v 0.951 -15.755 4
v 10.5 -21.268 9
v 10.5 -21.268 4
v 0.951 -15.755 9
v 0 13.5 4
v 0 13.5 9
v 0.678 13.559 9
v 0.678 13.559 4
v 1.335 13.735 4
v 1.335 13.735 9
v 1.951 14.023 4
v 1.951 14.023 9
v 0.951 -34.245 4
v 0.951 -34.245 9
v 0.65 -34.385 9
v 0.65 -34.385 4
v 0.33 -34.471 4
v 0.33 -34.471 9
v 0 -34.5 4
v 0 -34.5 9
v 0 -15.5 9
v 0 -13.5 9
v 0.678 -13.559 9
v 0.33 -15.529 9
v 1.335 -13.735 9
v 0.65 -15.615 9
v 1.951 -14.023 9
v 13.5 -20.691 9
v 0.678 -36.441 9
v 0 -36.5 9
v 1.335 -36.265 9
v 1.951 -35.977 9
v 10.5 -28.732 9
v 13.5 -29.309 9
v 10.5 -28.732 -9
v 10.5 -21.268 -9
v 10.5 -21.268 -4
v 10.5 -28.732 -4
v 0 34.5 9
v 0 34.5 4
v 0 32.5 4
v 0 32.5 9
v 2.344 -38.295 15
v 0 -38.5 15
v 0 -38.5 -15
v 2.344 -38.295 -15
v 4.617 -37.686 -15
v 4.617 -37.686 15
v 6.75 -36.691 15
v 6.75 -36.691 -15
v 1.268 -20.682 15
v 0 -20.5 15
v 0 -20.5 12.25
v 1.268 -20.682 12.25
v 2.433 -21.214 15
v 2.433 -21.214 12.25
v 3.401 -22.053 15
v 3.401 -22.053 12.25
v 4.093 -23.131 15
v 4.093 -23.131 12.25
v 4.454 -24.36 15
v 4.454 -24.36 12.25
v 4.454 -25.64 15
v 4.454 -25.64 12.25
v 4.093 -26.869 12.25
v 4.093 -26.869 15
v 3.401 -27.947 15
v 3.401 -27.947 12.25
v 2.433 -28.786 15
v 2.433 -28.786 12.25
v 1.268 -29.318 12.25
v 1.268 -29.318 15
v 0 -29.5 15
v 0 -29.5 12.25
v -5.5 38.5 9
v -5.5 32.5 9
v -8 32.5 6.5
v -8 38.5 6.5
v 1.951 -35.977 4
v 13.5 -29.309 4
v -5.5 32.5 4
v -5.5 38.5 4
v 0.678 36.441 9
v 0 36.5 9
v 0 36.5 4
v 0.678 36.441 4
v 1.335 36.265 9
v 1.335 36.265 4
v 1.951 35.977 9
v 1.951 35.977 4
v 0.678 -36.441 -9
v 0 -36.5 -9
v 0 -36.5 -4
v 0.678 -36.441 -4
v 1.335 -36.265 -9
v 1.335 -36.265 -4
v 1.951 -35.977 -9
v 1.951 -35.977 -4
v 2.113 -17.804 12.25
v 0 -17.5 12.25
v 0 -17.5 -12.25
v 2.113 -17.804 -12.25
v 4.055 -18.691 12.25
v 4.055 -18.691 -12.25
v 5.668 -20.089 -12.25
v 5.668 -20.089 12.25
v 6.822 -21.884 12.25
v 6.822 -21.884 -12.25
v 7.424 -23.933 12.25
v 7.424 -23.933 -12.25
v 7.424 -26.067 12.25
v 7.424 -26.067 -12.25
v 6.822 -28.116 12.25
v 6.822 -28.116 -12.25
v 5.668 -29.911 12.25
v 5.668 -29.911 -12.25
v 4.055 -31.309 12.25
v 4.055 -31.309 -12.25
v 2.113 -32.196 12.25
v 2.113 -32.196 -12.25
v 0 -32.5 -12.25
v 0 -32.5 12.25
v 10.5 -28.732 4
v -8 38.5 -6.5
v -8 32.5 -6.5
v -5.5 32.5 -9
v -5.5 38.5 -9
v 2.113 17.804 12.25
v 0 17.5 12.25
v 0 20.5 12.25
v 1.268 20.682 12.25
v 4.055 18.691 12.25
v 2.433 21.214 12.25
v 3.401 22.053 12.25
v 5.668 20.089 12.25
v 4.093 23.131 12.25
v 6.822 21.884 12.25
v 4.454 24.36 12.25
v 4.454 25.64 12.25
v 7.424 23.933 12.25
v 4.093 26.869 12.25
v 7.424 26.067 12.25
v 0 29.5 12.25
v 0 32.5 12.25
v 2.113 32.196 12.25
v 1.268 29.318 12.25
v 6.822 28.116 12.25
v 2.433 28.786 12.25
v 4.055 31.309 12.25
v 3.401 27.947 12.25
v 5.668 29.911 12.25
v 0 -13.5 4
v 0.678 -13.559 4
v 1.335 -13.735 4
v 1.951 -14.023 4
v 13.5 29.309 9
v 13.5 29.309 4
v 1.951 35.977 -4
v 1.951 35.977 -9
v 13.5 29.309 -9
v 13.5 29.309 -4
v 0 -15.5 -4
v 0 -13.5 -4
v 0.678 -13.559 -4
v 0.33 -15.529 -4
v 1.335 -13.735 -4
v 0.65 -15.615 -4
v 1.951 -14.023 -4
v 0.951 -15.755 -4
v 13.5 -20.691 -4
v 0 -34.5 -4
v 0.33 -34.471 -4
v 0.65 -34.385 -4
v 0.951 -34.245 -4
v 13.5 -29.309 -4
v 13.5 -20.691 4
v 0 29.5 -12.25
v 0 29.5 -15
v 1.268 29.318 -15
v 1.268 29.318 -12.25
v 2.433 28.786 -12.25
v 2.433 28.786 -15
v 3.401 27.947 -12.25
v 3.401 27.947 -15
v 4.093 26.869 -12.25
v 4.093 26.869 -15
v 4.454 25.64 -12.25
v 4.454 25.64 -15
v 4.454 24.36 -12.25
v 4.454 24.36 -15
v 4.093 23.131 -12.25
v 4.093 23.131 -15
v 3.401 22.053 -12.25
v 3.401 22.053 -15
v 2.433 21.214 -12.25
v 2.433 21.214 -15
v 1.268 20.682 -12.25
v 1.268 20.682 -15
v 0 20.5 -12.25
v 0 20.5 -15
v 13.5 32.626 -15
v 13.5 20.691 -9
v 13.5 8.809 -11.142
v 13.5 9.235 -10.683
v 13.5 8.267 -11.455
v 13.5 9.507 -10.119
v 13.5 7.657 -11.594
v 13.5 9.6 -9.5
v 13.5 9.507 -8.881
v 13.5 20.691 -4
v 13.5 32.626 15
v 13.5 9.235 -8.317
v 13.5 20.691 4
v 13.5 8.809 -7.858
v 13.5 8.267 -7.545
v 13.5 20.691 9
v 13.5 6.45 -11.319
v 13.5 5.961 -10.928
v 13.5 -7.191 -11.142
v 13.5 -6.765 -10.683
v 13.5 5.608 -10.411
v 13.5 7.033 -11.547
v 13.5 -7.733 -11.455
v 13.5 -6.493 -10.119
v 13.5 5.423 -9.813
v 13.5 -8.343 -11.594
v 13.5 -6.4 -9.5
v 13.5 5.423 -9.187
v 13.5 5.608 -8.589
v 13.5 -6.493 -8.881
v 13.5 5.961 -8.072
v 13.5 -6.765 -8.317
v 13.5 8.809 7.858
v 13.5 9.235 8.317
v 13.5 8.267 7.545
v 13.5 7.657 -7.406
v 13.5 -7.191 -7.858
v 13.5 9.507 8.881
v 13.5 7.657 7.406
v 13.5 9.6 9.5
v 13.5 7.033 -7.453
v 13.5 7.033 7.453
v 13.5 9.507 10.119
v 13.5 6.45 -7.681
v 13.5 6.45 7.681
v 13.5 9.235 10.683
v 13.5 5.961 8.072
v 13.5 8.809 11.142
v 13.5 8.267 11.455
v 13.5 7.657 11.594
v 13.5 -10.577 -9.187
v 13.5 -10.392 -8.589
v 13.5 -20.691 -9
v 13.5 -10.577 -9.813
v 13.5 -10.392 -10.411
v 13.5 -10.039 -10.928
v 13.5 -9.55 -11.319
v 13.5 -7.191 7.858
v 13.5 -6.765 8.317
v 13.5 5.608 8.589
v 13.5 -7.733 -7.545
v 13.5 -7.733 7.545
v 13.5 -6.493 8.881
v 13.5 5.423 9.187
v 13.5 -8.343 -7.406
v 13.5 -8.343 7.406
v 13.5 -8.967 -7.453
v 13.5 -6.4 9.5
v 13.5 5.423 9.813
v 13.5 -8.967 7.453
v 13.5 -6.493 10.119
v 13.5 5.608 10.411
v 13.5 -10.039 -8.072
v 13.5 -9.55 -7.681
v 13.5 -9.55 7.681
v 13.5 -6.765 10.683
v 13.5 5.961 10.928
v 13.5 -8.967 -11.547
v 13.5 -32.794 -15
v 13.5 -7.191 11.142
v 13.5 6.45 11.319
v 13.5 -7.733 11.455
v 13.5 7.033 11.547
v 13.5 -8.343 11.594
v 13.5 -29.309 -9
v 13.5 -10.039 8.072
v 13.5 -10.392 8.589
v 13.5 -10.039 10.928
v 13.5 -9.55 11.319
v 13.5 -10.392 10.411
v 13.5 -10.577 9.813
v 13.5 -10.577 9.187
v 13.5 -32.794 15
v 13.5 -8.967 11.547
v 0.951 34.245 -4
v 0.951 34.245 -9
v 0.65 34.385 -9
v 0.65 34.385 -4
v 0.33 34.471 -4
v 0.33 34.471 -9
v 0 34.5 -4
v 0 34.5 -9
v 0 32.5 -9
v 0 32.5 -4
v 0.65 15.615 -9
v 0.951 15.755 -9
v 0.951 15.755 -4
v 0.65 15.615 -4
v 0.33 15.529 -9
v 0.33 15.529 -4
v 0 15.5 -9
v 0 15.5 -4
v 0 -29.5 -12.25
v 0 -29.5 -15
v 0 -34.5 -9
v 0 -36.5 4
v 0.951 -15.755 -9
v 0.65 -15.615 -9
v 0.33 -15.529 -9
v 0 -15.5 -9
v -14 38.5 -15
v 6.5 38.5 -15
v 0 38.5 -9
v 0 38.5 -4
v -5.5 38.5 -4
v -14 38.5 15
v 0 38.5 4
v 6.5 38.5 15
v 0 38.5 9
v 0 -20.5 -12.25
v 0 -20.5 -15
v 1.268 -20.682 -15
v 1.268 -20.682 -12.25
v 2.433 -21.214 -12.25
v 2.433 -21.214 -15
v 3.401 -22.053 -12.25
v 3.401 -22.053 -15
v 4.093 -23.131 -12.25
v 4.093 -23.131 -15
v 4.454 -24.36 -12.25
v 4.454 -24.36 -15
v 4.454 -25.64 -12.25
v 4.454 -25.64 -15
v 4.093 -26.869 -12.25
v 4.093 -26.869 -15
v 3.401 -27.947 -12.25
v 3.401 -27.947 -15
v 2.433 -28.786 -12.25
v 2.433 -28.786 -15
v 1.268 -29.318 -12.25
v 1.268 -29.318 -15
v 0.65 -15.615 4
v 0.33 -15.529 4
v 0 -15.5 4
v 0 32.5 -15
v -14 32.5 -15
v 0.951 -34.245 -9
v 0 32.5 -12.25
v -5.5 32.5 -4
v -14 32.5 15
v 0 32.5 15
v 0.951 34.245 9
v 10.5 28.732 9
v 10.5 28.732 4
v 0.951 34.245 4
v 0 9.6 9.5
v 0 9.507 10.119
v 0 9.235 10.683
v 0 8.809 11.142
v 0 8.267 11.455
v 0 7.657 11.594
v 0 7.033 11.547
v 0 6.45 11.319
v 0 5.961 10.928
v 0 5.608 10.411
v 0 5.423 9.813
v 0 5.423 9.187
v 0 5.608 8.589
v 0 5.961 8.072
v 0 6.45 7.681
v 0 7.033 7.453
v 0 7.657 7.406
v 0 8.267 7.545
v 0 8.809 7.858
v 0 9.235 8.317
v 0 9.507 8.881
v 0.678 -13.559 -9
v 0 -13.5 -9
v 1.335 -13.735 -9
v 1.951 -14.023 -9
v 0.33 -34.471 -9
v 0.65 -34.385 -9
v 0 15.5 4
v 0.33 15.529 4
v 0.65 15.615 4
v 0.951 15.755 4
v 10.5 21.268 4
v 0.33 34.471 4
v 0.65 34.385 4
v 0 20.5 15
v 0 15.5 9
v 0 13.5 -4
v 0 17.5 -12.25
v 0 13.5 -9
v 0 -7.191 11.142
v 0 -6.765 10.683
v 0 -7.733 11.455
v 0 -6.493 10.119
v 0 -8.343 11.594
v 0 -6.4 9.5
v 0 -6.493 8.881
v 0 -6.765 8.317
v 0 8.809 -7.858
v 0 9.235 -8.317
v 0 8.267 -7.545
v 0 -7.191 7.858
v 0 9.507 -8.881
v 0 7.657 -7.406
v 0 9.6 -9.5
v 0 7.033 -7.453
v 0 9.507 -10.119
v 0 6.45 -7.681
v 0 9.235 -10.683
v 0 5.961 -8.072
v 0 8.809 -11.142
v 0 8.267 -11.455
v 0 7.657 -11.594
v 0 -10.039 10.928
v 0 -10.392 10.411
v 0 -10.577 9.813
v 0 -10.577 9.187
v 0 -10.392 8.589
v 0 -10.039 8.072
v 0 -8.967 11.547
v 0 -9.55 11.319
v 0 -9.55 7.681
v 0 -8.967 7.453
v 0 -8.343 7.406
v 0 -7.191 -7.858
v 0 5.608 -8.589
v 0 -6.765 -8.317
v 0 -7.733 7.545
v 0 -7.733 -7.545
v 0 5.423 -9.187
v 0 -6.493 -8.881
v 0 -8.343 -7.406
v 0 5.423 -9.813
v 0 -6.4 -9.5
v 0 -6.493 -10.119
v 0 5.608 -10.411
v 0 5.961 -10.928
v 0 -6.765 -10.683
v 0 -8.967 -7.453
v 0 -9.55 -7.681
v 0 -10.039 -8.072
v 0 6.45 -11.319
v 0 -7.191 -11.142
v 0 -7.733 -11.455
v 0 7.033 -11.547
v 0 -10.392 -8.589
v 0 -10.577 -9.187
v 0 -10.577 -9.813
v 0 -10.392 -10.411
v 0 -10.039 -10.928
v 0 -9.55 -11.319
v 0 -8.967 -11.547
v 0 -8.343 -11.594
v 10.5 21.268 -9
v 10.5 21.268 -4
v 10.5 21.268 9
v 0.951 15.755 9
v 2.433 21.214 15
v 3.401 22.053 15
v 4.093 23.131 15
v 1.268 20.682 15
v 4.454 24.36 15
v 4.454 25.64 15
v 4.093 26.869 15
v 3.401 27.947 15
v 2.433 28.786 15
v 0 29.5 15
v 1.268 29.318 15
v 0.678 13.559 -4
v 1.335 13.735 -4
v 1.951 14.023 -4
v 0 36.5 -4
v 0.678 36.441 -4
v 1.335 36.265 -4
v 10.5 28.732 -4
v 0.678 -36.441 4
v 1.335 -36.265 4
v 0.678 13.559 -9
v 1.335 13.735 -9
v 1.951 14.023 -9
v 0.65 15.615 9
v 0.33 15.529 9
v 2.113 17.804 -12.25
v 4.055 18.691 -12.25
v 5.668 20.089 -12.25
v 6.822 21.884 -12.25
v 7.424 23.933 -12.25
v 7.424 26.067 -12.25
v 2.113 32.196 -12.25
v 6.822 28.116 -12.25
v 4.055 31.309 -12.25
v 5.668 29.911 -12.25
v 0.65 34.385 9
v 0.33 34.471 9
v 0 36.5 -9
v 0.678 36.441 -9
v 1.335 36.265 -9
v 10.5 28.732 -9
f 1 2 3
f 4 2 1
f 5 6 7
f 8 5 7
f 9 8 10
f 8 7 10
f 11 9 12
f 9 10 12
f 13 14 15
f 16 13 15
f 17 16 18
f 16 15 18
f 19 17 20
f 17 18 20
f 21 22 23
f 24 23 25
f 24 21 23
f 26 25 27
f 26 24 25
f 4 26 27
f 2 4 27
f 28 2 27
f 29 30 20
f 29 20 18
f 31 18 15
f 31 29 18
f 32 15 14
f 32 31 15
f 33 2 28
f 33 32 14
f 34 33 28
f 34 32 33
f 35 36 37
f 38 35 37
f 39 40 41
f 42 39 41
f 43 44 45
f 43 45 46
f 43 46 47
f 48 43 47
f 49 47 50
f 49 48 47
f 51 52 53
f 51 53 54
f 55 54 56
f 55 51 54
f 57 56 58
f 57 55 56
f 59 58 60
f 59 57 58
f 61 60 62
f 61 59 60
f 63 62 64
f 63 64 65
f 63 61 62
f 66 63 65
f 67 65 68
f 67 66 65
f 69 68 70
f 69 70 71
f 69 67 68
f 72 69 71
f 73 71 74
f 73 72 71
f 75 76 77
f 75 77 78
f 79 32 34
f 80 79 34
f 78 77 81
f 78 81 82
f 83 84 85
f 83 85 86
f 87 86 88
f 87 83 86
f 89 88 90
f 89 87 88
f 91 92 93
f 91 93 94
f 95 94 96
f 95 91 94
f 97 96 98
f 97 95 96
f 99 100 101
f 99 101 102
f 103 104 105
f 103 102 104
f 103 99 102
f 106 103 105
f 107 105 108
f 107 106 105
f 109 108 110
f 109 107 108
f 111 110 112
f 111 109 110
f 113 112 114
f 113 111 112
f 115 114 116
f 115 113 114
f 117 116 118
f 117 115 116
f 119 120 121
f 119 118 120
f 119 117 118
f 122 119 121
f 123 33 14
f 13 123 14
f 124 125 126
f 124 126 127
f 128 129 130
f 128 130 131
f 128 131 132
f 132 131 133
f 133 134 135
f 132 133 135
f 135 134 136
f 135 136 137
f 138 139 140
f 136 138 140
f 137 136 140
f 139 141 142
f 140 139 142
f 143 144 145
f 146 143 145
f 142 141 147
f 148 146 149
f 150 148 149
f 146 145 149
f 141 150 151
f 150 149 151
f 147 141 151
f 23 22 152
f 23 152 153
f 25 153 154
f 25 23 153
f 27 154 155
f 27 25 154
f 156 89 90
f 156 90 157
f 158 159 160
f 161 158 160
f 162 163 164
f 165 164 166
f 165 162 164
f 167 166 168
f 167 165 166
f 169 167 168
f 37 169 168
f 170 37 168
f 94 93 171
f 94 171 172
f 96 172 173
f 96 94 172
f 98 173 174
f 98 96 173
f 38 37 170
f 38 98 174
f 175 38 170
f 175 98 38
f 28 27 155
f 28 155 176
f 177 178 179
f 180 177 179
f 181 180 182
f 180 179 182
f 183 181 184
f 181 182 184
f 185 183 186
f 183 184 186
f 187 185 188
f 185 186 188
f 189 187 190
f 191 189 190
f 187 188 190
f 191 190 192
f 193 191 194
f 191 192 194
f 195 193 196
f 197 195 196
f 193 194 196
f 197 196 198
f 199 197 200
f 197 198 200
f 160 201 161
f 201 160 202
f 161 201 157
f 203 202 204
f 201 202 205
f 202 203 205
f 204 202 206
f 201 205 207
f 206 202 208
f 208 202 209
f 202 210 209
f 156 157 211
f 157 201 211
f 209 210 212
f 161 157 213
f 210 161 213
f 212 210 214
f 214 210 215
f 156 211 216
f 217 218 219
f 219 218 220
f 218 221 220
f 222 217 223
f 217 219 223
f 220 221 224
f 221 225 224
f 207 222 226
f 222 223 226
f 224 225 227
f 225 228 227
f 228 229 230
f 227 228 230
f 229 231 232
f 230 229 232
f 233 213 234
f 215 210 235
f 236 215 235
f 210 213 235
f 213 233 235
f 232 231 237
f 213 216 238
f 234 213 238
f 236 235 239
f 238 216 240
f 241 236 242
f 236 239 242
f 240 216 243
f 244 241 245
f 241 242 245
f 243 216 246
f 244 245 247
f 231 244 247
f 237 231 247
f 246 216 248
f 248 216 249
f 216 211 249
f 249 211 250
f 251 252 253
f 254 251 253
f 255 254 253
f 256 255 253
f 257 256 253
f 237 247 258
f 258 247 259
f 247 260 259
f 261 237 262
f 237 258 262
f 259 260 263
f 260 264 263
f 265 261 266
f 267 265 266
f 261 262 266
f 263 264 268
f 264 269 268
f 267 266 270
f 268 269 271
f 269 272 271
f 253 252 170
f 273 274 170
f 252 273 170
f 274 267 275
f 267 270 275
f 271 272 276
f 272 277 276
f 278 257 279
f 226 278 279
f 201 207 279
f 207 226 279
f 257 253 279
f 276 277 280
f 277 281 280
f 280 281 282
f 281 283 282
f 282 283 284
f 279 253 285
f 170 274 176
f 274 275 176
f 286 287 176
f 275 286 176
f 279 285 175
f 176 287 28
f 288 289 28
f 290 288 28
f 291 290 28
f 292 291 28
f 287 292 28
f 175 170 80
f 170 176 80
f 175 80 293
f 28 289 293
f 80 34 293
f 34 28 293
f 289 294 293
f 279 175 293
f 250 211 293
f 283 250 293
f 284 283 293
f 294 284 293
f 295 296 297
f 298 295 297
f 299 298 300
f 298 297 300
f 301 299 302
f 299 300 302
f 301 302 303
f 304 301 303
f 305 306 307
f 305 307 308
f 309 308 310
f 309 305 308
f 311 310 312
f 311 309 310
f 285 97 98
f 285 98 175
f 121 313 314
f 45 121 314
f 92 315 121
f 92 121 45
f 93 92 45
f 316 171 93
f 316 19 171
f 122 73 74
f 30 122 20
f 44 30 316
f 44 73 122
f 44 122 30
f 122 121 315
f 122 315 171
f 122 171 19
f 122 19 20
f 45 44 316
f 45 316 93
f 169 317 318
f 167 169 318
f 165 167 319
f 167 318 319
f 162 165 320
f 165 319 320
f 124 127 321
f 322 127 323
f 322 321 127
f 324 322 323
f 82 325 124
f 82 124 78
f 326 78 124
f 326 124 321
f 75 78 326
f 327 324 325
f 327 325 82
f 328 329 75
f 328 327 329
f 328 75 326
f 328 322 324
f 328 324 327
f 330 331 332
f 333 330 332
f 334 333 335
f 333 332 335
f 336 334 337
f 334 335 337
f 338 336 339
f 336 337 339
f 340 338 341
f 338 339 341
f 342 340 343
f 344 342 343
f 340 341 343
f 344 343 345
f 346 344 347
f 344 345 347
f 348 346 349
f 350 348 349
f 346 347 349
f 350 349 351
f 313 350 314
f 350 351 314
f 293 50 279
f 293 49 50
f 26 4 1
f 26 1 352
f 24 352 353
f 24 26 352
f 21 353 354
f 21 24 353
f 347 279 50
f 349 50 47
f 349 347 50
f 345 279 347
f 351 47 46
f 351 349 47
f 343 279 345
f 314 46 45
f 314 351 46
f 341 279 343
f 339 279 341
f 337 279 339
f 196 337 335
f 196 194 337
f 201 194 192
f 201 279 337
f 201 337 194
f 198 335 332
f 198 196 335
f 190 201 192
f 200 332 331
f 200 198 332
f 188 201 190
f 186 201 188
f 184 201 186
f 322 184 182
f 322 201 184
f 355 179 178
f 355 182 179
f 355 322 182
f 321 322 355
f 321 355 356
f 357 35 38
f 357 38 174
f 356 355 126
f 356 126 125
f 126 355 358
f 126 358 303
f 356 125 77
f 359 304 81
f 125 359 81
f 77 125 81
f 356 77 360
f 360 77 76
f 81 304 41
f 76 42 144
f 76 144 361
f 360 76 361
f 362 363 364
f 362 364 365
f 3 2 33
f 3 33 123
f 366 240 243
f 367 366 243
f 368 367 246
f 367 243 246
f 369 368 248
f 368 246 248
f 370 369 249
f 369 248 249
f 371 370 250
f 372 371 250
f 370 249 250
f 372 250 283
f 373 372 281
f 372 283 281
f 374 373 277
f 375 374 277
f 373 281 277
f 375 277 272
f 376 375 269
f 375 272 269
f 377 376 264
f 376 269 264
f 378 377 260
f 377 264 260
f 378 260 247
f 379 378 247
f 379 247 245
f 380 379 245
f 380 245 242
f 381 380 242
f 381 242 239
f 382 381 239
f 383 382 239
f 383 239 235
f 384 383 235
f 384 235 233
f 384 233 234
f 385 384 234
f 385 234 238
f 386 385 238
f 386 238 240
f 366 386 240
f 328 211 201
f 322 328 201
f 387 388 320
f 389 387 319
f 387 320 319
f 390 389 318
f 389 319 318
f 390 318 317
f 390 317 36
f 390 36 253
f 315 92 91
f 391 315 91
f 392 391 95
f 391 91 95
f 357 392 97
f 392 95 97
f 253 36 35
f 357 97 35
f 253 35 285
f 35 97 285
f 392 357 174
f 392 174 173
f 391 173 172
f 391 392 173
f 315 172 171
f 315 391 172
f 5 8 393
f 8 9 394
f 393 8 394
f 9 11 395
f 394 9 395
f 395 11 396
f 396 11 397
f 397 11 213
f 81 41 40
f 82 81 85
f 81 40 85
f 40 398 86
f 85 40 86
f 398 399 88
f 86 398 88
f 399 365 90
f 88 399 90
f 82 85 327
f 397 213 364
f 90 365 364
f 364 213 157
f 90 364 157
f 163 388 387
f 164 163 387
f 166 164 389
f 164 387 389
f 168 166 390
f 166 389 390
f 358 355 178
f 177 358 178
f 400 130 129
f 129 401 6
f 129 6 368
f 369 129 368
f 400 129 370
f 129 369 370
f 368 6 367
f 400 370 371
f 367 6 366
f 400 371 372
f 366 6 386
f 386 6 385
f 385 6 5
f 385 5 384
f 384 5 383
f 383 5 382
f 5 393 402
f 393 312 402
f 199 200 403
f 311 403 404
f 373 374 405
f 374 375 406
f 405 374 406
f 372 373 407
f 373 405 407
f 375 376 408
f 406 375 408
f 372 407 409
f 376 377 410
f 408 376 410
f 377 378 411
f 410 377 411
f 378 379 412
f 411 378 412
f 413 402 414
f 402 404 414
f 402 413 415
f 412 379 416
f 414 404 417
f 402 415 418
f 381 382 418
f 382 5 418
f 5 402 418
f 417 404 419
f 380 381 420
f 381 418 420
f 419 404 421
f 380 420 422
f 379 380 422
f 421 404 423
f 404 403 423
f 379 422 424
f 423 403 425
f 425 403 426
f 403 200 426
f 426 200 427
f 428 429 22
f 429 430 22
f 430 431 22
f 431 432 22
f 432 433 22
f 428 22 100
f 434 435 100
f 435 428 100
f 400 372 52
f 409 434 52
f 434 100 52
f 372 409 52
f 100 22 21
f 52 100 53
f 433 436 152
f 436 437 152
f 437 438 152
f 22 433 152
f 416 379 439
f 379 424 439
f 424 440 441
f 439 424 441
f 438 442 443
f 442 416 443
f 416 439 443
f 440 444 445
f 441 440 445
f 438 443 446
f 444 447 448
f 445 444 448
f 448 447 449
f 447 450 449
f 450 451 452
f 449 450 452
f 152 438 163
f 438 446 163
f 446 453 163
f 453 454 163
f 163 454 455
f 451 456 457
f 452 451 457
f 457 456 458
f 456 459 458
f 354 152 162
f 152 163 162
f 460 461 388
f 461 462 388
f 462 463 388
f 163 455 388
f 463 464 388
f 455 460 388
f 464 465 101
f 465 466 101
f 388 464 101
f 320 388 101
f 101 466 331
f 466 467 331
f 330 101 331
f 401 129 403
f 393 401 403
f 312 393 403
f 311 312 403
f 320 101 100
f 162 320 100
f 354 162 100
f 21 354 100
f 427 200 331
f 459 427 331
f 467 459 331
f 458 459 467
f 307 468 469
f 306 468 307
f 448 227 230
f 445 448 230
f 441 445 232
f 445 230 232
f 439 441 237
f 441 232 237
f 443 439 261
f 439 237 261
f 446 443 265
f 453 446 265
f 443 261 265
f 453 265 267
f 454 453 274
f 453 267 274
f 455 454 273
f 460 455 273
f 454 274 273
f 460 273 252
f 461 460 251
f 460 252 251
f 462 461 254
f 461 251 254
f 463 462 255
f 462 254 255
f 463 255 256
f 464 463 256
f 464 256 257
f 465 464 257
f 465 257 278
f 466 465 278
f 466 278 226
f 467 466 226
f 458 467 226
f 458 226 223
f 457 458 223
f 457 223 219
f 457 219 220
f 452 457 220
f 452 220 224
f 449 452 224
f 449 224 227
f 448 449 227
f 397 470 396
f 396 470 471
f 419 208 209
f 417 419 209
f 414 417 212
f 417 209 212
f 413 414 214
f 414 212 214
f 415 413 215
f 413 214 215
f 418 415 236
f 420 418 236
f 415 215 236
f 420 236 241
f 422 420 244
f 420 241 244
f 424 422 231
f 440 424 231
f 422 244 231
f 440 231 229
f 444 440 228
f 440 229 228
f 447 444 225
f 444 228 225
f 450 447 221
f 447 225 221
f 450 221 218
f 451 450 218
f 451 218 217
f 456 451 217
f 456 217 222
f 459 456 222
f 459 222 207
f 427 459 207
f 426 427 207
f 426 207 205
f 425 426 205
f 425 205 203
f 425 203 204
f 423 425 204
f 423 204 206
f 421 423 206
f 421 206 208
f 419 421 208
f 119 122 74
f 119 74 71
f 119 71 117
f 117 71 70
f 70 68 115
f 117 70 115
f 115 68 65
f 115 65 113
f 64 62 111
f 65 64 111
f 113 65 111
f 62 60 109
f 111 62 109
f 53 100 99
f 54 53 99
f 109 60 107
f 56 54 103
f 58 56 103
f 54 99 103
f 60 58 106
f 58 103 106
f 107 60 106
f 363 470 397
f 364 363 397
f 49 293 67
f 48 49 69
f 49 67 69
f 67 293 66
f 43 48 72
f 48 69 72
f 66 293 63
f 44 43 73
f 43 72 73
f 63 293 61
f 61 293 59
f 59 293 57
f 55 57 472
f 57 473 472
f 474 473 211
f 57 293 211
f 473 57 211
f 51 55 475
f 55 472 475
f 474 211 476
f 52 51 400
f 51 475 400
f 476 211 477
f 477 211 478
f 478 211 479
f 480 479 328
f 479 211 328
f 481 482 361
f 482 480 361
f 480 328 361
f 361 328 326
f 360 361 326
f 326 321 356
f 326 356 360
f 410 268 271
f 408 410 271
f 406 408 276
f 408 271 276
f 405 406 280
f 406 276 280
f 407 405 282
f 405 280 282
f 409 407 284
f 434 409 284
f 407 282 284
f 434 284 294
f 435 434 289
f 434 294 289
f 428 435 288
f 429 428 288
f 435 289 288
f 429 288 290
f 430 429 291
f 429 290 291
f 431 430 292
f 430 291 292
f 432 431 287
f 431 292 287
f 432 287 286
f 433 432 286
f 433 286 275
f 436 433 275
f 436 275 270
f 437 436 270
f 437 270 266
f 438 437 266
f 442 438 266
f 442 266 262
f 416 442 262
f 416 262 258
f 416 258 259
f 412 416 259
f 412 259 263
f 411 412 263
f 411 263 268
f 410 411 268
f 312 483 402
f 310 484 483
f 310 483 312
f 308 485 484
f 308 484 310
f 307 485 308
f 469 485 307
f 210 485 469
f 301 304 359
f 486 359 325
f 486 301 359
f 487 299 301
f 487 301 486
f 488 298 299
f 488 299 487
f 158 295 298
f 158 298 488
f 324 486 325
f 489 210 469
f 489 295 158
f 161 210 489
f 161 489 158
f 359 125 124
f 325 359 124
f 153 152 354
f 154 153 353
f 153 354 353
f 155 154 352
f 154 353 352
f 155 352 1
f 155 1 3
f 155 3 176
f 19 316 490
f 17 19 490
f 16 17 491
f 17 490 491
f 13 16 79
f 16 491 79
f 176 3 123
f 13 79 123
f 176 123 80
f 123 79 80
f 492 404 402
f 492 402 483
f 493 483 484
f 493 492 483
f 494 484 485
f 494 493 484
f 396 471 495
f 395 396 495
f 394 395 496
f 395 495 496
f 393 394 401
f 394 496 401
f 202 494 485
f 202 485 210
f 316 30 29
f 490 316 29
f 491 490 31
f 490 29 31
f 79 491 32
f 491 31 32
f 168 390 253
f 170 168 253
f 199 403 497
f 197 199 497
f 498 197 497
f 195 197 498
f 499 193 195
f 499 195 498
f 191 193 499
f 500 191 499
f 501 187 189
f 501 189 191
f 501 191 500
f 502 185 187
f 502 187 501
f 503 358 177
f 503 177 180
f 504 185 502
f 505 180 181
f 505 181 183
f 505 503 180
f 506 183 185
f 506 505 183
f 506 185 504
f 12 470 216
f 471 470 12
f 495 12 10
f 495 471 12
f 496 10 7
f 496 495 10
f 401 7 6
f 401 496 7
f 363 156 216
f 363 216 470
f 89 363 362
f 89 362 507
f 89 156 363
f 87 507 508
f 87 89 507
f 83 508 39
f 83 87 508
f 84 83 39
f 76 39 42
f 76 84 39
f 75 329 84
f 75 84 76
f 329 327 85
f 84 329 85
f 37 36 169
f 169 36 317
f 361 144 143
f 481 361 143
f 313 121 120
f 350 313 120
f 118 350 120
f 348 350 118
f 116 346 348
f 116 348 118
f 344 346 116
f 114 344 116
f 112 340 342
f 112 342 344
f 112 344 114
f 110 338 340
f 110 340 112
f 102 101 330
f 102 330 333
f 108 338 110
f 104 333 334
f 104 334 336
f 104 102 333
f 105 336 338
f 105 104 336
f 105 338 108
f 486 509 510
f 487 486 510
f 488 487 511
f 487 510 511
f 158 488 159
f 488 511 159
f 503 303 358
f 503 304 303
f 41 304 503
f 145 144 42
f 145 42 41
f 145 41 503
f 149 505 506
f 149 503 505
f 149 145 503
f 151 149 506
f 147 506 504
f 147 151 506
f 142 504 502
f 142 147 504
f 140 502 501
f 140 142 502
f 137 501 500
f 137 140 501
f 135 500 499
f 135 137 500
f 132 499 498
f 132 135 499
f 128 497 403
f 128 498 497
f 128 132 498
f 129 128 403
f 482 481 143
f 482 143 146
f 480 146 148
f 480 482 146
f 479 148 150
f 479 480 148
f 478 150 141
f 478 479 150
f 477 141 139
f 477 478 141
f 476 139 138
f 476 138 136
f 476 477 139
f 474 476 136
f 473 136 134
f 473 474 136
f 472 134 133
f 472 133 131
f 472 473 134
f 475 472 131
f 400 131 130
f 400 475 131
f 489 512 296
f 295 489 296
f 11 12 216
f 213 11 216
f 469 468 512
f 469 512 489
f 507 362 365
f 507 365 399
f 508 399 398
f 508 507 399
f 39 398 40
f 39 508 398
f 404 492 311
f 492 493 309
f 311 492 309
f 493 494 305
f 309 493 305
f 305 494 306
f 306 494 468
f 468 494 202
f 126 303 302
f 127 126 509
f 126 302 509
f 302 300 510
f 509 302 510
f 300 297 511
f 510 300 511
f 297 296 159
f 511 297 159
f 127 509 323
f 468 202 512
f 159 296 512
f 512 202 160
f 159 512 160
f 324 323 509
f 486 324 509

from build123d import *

# Parameters (mm, degrees)
BOSS_EXTRUDE1_DEPTH     = 15
BOSS_EXTRUDE2_DEPTH     = 2.75
CUT_EXTRUDE1_START      = -6
CUT_EXTRUDE1_DEPTH      = 5
SKETCH5_W               = 5
SKETCH5_H               = 8.618802154
CUT_EXTRUDE2_DEPTH      = 3
MIRROR5_START           = -6
MIRROR5_COPY_1_DEPTH    = 5
MIRROR5_COPY_2_SKETCH_W = 5
MIRROR5_COPY_2_SKETCH_H = 8.618802154
MIRROR5_COPY_2_DEPTH    = 3
SKETCH6_R               = 2.1
CUT_EXTRUDE3_DEPTH      = 44.468379312
LPATTERN2_COUNT         = 2
LPATTERN2_PITCH         = 16
BOSS_EXTRUDE3_DEPTH     = 30
SKETCH9_W               = 8
SKETCH9_H               = 6
SKETCH9_W_2             = 6
BOSS_EXTRUDE4_DEPTH     = 14
SKETCH10_W              = 30
SKETCH10_H              = 6
BOSS_EXTRUDE5_DEPTH     = 6
CHAMFER1_SIZE           = 2.5
CHAMFER2_SIZE           = 7
CHAMFER2_SIZE2          = 5.873697418


with BuildPart() as part:
    # Sketch1 → Boss-Extrude1 (new, symmetric)
    with BuildSketch(Plane.XY):
        with BuildLine():
            Line((13.5, -25), (13.5, 25))
            Line((13.5, 25), (13.5, 32.794228634))
            Line((13.5, 32.794228634), (6.75, 36.691342951))
            ThreePointArc((6.75, 36.691342951), (3.494057109, 38.039998655), (0, 38.5))
            Line((0, 38.5), (0, 32.5))
            ThreePointArc((0, 32.5), (7.5, 25), (0, 17.5))
            Line((0, 17.5), (0, -17.5))
            ThreePointArc((0, -17.5), (7.5, -25), (0, -32.5))
            Line((0, -32.5), (0, -38.5))
            ThreePointArc((0, -38.5), (3.494057109, -38.039998655), (6.75, -36.691342951))
            Line((6.75, -36.691342951), (13.5, -32.794228634))
            Line((13.5, -32.794228634), (13.5, -25))
        make_face()
    extrude(amount=BOSS_EXTRUDE1_DEPTH, both=True)

    # Sketch2 → Boss-Extrude2 (add)
    with BuildSketch(Plane.XY.offset(15)):
        with BuildLine():
            Line((0, 32.5), (0, 29.5))
            ThreePointArc((0, 29.5), (4.5, 25), (0, 20.5))
            Line((0, 20.5), (0, 17.5))
            ThreePointArc((0, 17.5), (7.5, 25), (0, 32.5))
        make_face()
        with BuildLine():
            Line((0, -17.5), (0, -20.5))
            ThreePointArc((0, -20.5), (4.5, -25), (0, -29.5))
            Line((0, -29.5), (0, -32.5))
            ThreePointArc((0, -32.5), (7.5, -25), (0, -17.5))
        make_face()
    boss_extrude2 = extrude(amount=-BOSS_EXTRUDE2_DEPTH)

    # Mirror1: Boss-Extrude2 across plane
    add(boss_extrude2.mirror(Plane.XY))

    # Sketch3 → Cut-Extrude1 (cut)
    with BuildSketch(Plane.XY.offset(15).offset(CUT_EXTRUDE1_START)):
        with BuildLine():
            Line((0, 34.5), (0, 36.5))
            ThreePointArc((0, 36.5), (1.009892189, 36.367045171), (1.950961894, 35.977241336))
            Line((1.950961894, 35.977241336), (13.5, 29.309401077))
            Line((13.5, 29.309401077), (13.5, 27))
            Line((13.5, 27), (0.950961894, 34.245190528))
            ThreePointArc((0.950961894, 34.245190528), (0.492254099, 34.435193518), (0, 34.5))
        make_face()
        with BuildLine():
            Line((13.5, 23), (0.950961894, 15.754809472))
            ThreePointArc((0.950961894, 15.754809472), (0.492254099, 15.564806482), (0, 15.5))
            Line((0, 15.5), (0, 13.5))
            ThreePointArc((0, 13.5), (1.009892189, 13.632954829), (1.950961894, 14.022758664))
            Line((1.950961894, 14.022758664), (13.5, 20.690598923))
            Line((13.5, 20.690598923), (13.5, 23))
        make_face()
    cut_extrude1 = extrude(amount=-CUT_EXTRUDE1_DEPTH, mode=Mode.SUBTRACT)

    # Sketch5 → Cut-Extrude2 (cut)
    with BuildSketch(Plane(origin=(13.5, 0, 0), x_dir=(0, 0, -1), z_dir=(1, 0, 0))):
        with Locations((-6.5, 25)):
            Rectangle(SKETCH5_W, SKETCH5_H)
    cut_extrude2 = extrude(amount=-CUT_EXTRUDE2_DEPTH, mode=Mode.SUBTRACT)

    # Mirror3: Cut-Extrude1, Cut-Extrude2 across plane
    add(cut_extrude1.mirror(Plane.XY), mode=Mode.SUBTRACT)
    add(cut_extrude2.mirror(Plane.XY), mode=Mode.SUBTRACT)

    # Mirror5: Cut-Extrude1, Cut-Extrude2 across plane
    add(cut_extrude1.mirror(Plane.ZX), mode=Mode.SUBTRACT)
    add(cut_extrude2.mirror(Plane.ZX), mode=Mode.SUBTRACT)

    # Mirror5 copy 1 sketch → Mirror5 copy 1 (cut)
    with BuildSketch(Plane(origin=(0, 0, -15), x_dir=(1, 0, 0), z_dir=(0, 0, -1)).offset(MIRROR5_START)):
        with BuildLine():
            Line((0, 34.5), (0, 36.5))
            ThreePointArc((0, 36.5), (1.009892189, 36.367045171), (1.950961894, 35.977241336))
            Line((1.950961894, 35.977241336), (13.5, 29.309401077))
            Line((13.5, 29.309401077), (13.5, 27))
            Line((13.5, 27), (0.950961894, 34.245190528))
            ThreePointArc((0.950961894, 34.245190528), (0.492254099, 34.435193518), (0, 34.5))
        make_face()
        with BuildLine():
            Line((13.5, 23), (0.950961894, 15.754809472))
            ThreePointArc((0.950961894, 15.754809472), (0.492254099, 15.564806482), (0, 15.5))
            Line((0, 15.5), (0, 13.5))
            ThreePointArc((0, 13.5), (1.009892189, 13.632954829), (1.950961894, 14.022758664))
            Line((1.950961894, 14.022758664), (13.5, 20.690598923))
            Line((13.5, 20.690598923), (13.5, 23))
        make_face()
    extrude(amount=-MIRROR5_COPY_1_DEPTH, mode=Mode.SUBTRACT)

    # Mirror5 copy 2 sketch → Mirror5 copy 2 (cut)
    with BuildSketch(Plane(origin=(13.5, 0, 0), x_dir=(0, 0, 1), z_dir=(1, 0, 0))):
        with Locations((-6.5, 25)):
            Rectangle(MIRROR5_COPY_2_SKETCH_W, MIRROR5_COPY_2_SKETCH_H)
    extrude(amount=-MIRROR5_COPY_2_DEPTH, mode=Mode.SUBTRACT)

    # Sketch6 → Cut-Extrude3 (cut, through all)
    with BuildSketch(Plane(origin=(13.5, 0, 0), x_dir=(0, 0, -1), z_dir=(1, 0, 0))):
        with Locations(Location((-9.5, -8.5, 0), (0, 0, 90))):
            Circle(SKETCH6_R)
        with Locations(Location((9.5, -8.5, 0), (0, 0, 90))):
            Circle(SKETCH6_R)
    cut_extrude3 = extrude(amount=-CUT_EXTRUDE3_DEPTH, mode=Mode.SUBTRACT)

    # LPattern2: Cut-Extrude3 ×2
    with Locations(*[(0, i * LPATTERN2_PITCH, 0) for i in range(1, LPATTERN2_COUNT)]):
        add(cut_extrude3, mode=Mode.SUBTRACT)

    # Sketch8 → Boss-Extrude3 (add)
    with BuildSketch(Plane.XY.offset(15)):
        with BuildLine():
            Line((0, 38.5), (13.5, 38.5))
            Line((13.5, 38.5), (13.5, 32.794228634))
            Line((13.5, 32.794228634), (6.75, 36.691342951))
            ThreePointArc((6.75, 36.691342951), (3.494057109, 38.039998655), (0, 38.5))
        make_face()
    extrude(amount=-BOSS_EXTRUDE3_DEPTH)

    # Sketch9 → Boss-Extrude4 (add)
    with BuildSketch(Plane.ZY):
        with Locations((0, 35.5)):
            Rectangle(SKETCH9_W, SKETCH9_H)
        with Locations((12, 35.5)):
            Rectangle(SKETCH9_W_2, SKETCH9_H)
        with Locations((-12, 35.5)):
            Rectangle(SKETCH9_W_2, SKETCH9_H)
    extrude(amount=BOSS_EXTRUDE4_DEPTH)

    # Sketch10 → Boss-Extrude5 (add)
    with BuildSketch(Plane.ZY.offset(14)):
        with Locations((0, 35.5)):
            Rectangle(SKETCH10_W, SKETCH10_H)
    extrude(amount=-BOSS_EXTRUDE5_DEPTH)

    # Chamfer1
    chamfer1_edges = [part.edges().sort_by_distance(p)[0] for p in [
        (-8, 35.5, 4),
        (-8, 35.5, 9),
        (-8, 35.5, -4),
        (-8, 35.5, -9),
    ]]
    chamfer(chamfer1_edges, length=CHAMFER1_SIZE - 0.0001)  # a hair under: the kernel refuses the full size

    # Chamfer2
    chamfer2_edges = [part.edges().sort_by_distance(p)[0] for p in [
        (13.5, 38.5, 0),
    ]]
    chamfer2_side = [part.faces().sort_by_distance(p)[0] for p in [
        (0.031912143, 38.5, 0),
    ]]
    chamfer(chamfer2_edges, length=CHAMFER2_SIZE, length2=CHAMFER2_SIZE2, reference=chamfer2_side[0])


solid = part.part
